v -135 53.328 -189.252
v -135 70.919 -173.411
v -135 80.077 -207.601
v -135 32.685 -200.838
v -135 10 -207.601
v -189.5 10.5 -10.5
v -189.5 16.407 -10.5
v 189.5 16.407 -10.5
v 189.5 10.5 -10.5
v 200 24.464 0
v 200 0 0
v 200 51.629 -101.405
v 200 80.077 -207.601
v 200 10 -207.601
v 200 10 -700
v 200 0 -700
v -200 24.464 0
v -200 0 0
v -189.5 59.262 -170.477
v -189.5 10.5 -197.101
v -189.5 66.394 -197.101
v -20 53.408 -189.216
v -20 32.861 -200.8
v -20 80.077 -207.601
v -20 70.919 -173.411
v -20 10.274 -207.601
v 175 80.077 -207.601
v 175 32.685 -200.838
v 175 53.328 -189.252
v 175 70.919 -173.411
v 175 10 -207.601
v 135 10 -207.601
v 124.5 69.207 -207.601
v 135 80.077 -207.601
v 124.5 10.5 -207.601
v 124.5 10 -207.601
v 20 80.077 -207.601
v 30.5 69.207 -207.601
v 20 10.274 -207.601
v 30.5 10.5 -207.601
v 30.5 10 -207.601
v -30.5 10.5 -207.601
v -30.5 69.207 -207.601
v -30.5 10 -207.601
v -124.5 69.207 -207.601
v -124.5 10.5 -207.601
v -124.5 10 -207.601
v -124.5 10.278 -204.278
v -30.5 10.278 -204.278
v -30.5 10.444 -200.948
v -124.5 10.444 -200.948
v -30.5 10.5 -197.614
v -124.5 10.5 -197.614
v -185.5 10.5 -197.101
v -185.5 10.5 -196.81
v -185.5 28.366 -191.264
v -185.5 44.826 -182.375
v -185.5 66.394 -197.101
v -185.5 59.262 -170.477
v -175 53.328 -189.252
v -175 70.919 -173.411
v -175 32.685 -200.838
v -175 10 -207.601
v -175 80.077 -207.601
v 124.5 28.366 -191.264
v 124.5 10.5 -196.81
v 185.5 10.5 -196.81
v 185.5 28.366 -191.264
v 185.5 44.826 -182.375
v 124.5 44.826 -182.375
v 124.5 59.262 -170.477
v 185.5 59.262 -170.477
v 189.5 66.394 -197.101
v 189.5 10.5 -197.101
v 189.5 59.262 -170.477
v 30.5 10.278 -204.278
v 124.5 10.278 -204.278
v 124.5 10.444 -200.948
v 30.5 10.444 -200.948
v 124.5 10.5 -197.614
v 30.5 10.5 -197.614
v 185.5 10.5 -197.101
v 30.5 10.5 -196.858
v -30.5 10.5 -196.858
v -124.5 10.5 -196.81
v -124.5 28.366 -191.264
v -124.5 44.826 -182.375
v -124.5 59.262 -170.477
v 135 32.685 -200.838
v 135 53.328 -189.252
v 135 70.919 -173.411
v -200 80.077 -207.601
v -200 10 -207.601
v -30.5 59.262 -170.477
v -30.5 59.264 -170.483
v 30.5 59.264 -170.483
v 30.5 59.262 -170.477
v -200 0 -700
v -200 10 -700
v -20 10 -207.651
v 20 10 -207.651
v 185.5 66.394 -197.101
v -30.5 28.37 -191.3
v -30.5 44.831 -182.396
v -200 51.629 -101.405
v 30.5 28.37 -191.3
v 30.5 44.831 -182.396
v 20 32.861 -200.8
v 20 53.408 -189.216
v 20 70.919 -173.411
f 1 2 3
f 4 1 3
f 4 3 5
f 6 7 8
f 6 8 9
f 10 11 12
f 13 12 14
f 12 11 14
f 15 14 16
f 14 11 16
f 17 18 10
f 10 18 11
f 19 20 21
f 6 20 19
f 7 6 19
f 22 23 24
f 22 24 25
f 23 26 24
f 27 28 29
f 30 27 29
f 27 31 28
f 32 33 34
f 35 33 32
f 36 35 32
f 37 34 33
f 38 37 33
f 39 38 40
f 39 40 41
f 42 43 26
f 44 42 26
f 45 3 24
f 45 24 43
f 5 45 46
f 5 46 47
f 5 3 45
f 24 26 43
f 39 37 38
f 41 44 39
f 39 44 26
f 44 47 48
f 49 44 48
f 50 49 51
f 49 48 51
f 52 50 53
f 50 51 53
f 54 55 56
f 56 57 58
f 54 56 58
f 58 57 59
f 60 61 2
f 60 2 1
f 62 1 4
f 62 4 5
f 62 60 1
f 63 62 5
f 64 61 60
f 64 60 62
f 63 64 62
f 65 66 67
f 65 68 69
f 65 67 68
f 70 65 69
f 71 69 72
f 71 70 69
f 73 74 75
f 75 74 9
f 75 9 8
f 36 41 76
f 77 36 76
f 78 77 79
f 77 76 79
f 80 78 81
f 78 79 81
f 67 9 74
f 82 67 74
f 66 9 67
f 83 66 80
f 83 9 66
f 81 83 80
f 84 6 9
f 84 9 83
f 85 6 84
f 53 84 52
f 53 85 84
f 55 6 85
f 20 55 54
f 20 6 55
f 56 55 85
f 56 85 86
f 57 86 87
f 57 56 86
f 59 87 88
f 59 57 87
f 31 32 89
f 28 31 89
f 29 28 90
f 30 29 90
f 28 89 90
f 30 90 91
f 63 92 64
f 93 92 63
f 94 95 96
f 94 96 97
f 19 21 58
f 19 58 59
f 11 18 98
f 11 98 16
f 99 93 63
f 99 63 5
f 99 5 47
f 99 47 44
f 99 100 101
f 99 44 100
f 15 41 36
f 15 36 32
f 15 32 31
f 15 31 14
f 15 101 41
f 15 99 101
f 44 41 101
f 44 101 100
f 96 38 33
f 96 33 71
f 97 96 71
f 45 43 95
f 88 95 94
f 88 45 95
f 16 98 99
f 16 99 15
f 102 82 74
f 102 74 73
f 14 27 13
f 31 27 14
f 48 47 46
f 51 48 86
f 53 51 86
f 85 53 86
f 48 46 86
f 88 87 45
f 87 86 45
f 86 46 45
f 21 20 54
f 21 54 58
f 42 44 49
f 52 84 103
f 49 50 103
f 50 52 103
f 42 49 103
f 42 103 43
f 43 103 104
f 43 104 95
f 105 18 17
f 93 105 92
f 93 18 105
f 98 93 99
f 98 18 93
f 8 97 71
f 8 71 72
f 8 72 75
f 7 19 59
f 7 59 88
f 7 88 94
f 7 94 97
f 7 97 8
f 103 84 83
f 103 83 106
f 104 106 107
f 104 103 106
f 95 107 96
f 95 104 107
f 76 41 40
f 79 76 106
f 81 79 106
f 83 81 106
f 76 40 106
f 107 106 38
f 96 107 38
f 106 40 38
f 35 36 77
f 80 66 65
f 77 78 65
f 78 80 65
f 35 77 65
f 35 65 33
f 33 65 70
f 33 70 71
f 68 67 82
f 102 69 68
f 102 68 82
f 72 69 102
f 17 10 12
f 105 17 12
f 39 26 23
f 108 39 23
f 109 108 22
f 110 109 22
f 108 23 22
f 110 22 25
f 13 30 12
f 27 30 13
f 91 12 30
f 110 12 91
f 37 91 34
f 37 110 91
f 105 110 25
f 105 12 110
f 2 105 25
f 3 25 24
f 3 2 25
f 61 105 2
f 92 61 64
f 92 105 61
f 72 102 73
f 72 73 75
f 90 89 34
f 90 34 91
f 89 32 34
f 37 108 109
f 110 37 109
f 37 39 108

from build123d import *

# Parameters (mm, degrees)
SKETCH1_W                = 400
SKETCH1_H                = 700
BOSS_EXTRUDE1_DEPTH      = 10
BOSS_EXTRUDE2_DEPTH      = 200
BOSS_EXTRUDE2_DEPTH_BACK = 200
CUT_EXTRUDE3_DEPTH       = 20
CUT_EXTRUDE3_DEPTH_BACK  = 20
CUT_EXTRUDE4_DEPTH       = 20
CUT_EXTRUDE4_DEPTH_BACK  = 20
CUT_EXTRUDE5_DEPTH       = 20
CUT_EXTRUDE5_DEPTH_BACK  = 20
SHELL3_START             = -189.5
SHELL3_DEPTH             = 379
SHELL3_START_2           = -124.5
SHELL3_2_DEPTH           = 94
SHELL3_START_3           = 30.5
SHELL3_3_DEPTH           = 94
SHELL3_4_DEPTH           = 4
SHELL3_START_4           = 185.5
SHELL3_5_DEPTH           = 4
SHELL3_START_5           = -30.5
SHELL3_6_DEPTH           = 61
FILLET1_R                = 100


# Read off the part's stored shape, not the designer's step: Shell3
with BuildPart() as part:
    # Sketch1 → Boss-Extrude1 (new body)
    with BuildSketch(Plane(origin=(0, 0, 0), x_dir=(1, 0, 0), z_dir=(0, 1, 0))):
        with Locations((0, 350)):
            Rectangle(SKETCH1_W, SKETCH1_H)
    extrude(amount=BOSS_EXTRUDE1_DEPTH)

    # Sketch2 → Boss-Extrude2 (add, two sides: drawn at the far end of the back side and taken through both)
    with BuildSketch(Plane(origin=(0, 0, 0), x_dir=(0, 0, -1), z_dir=(1, 0, 0)).offset(-BOSS_EXTRUDE2_DEPTH_BACK)):
        Polygon((0, 0), (0, 24.464411704), (101.405231438, 51.629278733), (207.601036066, 80.077464993), (207.601036066, 0), align=None)
    extrude(amount=BOSS_EXTRUDE2_DEPTH + BOSS_EXTRUDE2_DEPTH_BACK)

    # Sketch5 → Cut-Extrude3 (cut, two sides: drawn at the far end of the back side and taken through both)
    with BuildSketch(Plane(origin=(0, 0, 0), x_dir=(0, 0, -1), z_dir=(1, 0, 0)).offset(-CUT_EXTRUDE3_DEPTH_BACK)):
        with BuildLine():
            Line((207.651134237, 88.230641516), (207.651134237, 10))
            ThreePointArc((207.651134237, 10), (195.644591457, 43.3333125), (173.411266827, 70.918563406))
            Line((173.411266827, 70.918563406), (207.651134237, 88.230641516))
        make_face()
    extrude(amount=CUT_EXTRUDE3_DEPTH + CUT_EXTRUDE3_DEPTH_BACK, mode=Mode.SUBTRACT)

    # Sketch7 → Cut-Extrude4 (cut, two sides: drawn at the far end of the back side and taken through both)
    with BuildSketch(Plane(origin=(155, 0, 0), x_dir=(0, 0, -1), z_dir=(1, 0, 0)).offset(-CUT_EXTRUDE4_DEPTH_BACK)):
        with BuildLine():
            Line((207.601036066, 80.077464993), (207.601036066, 10))
            ThreePointArc((207.601036066, 10), (195.617643187, 43.328041458), (173.411266827, 70.918563406))
            Line((173.411266827, 70.918563406), (164.696313807, 94.748714882))
            Line((164.696313807, 94.748714882), (211.114914406, 101.759857681))
            Line((211.114914406, 101.759857681), (207.601036066, 80.077464993))
        make_face()
    extrude(amount=CUT_EXTRUDE4_DEPTH + CUT_EXTRUDE4_DEPTH_BACK, mode=Mode.SUBTRACT)

    # Sketch8 → Cut-Extrude5 (cut, two sides: drawn at the far end of the back side and taken through both)
    with BuildSketch(Plane(origin=(-155, 0, 0), x_dir=(0, 0, -1), z_dir=(1, 0, 0)).offset(-CUT_EXTRUDE5_DEPTH_BACK)):
        with BuildLine():
            Line((207.601036066, 10), (207.601036066, 80.077464993))
            Line((207.601036066, 80.077464993), (173.411266827, 70.918563406))
            ThreePointArc((173.411266827, 70.918563406), (195.617643187, 43.328041458), (207.601036066, 10))
        make_face()
    extrude(amount=CUT_EXTRUDE5_DEPTH + CUT_EXTRUDE5_DEPTH_BACK, mode=Mode.SUBTRACT)

    # Shell3 outline → Shell3 (cut)
    with BuildSketch(Plane.YZ.offset(SHELL3_START)):
        with BuildLine():
            Line((10.5, -10.5), (10.5, -196.809675626))
            ThreePointArc((10.5, -196.809675626), (36.812126695, -187.219283255), (59.262427205, -170.477489921))
            Line((59.262427205, -170.477489921), (16.406973107, -10.5))
            Line((16.406973107, -10.5), (10.5, -10.5))
        make_face()
    extrude(amount=SHELL3_DEPTH, mode=Mode.SUBTRACT)

    # Shell3 2 outline → Shell3 2 (cut)
    with BuildSketch(Plane.YZ.offset(SHELL3_START_2)):
        with BuildLine():
            Line((10.5, -207.601036066), (69.207241495, -207.601036066))
            Line((69.207241495, -207.601036066), (59.262427205, -170.477489921))
            ThreePointArc((59.262427205, -170.477489921), (36.812126695, -187.219283255), (10.5, -196.809675626))
            Line((10.5, -196.809675626), (10.5, -207.601036066))
        make_face()
    extrude(amount=SHELL3_2_DEPTH, mode=Mode.SUBTRACT)

    # Shell3 3 outline → Shell3 3 (cut)
    with BuildSketch(Plane.YZ.offset(SHELL3_START_3)):
        with BuildLine():
            Line((10.5, -207.601036066), (69.207241495, -207.601036066))
            Line((69.207241495, -207.601036066), (59.262427205, -170.477489921))
            ThreePointArc((59.262427205, -170.477489921), (36.812126695, -187.219283255), (10.5, -196.809675626))
            Line((10.5, -196.809675626), (10.5, -207.601036066))
        make_face()
    extrude(amount=SHELL3_3_DEPTH, mode=Mode.SUBTRACT)

    # Shell3 4 outline → Shell3 4 (cut)
    with BuildSketch(Plane.YZ.offset(SHELL3_START)):
        with BuildLine():
            Line((10.5, -197.101036066), (66.394456595, -197.101036066))
            Line((66.394456595, -197.101036066), (59.262427205, -170.477489921))
            ThreePointArc((59.262427205, -170.477489921), (36.812126695, -187.219283255), (10.5, -196.809675626))
            Line((10.5, -196.809675626), (10.5, -197.101036066))
        make_face()
    extrude(amount=SHELL3_4_DEPTH, mode=Mode.SUBTRACT)

    # Shell3 5 outline → Shell3 5 (cut)
    with BuildSketch(Plane.YZ.offset(SHELL3_START_4)):
        with BuildLine():
            Line((10.5, -197.101036066), (66.394456595, -197.101036066))
            Line((66.394456595, -197.101036066), (59.262427205, -170.477489921))
            ThreePointArc((59.262427205, -170.477489921), (36.812126695, -187.219283255), (10.5, -196.809675626))
            Line((10.5, -196.809675626), (10.5, -197.101036066))
        make_face()
    extrude(amount=SHELL3_5_DEPTH, mode=Mode.SUBTRACT)

    # Shell3 6 outline → Shell3 6 (cut)
    with BuildSketch(Plane.YZ.offset(SHELL3_START_5)):
        with BuildLine():
            Line((10.5, -196.809675626), (10.5, -196.858395835))
            ThreePointArc((10.5, -196.858395835), (36.816809355, -187.247785942), (59.263801063, -170.482618469))
            Line((59.263801063, -170.482618469), (59.262427205, -170.477489921))
            ThreePointArc((59.262427205, -170.477489921), (36.812126695, -187.219283255), (10.5, -196.809675626))
        make_face()
    extrude(amount=SHELL3_6_DEPTH, mode=Mode.SUBTRACT)

    # Fillet1
    # the kernel refuses this fillet: 100 mm, written as the material it takes off along each edge
    with BuildSketch(Plane(origin=(30.5, 10.5, -207.601036066), x_dir=(0, -1.0, -9.585505722497512e-10), z_dir=(1, 0, 0)), Plane(origin=(-124.5, 10.5, -207.601036066), x_dir=(0, -1.0, -9.585505722497512e-10), z_dir=(1, 0, 0))) as fillet1_piece_1:
        with BuildLine():
            CenterArc((99.99999999, -9.987492273), FILLET1_R, 174.26803198, 5.731967965)
            Line((-1e-08, -9.987492177), (0, 0))
            Line((0, 0), (0.5, 0))
        make_face()
    extrude(amount=94, mode=Mode.SUBTRACT)


solid = part.part
